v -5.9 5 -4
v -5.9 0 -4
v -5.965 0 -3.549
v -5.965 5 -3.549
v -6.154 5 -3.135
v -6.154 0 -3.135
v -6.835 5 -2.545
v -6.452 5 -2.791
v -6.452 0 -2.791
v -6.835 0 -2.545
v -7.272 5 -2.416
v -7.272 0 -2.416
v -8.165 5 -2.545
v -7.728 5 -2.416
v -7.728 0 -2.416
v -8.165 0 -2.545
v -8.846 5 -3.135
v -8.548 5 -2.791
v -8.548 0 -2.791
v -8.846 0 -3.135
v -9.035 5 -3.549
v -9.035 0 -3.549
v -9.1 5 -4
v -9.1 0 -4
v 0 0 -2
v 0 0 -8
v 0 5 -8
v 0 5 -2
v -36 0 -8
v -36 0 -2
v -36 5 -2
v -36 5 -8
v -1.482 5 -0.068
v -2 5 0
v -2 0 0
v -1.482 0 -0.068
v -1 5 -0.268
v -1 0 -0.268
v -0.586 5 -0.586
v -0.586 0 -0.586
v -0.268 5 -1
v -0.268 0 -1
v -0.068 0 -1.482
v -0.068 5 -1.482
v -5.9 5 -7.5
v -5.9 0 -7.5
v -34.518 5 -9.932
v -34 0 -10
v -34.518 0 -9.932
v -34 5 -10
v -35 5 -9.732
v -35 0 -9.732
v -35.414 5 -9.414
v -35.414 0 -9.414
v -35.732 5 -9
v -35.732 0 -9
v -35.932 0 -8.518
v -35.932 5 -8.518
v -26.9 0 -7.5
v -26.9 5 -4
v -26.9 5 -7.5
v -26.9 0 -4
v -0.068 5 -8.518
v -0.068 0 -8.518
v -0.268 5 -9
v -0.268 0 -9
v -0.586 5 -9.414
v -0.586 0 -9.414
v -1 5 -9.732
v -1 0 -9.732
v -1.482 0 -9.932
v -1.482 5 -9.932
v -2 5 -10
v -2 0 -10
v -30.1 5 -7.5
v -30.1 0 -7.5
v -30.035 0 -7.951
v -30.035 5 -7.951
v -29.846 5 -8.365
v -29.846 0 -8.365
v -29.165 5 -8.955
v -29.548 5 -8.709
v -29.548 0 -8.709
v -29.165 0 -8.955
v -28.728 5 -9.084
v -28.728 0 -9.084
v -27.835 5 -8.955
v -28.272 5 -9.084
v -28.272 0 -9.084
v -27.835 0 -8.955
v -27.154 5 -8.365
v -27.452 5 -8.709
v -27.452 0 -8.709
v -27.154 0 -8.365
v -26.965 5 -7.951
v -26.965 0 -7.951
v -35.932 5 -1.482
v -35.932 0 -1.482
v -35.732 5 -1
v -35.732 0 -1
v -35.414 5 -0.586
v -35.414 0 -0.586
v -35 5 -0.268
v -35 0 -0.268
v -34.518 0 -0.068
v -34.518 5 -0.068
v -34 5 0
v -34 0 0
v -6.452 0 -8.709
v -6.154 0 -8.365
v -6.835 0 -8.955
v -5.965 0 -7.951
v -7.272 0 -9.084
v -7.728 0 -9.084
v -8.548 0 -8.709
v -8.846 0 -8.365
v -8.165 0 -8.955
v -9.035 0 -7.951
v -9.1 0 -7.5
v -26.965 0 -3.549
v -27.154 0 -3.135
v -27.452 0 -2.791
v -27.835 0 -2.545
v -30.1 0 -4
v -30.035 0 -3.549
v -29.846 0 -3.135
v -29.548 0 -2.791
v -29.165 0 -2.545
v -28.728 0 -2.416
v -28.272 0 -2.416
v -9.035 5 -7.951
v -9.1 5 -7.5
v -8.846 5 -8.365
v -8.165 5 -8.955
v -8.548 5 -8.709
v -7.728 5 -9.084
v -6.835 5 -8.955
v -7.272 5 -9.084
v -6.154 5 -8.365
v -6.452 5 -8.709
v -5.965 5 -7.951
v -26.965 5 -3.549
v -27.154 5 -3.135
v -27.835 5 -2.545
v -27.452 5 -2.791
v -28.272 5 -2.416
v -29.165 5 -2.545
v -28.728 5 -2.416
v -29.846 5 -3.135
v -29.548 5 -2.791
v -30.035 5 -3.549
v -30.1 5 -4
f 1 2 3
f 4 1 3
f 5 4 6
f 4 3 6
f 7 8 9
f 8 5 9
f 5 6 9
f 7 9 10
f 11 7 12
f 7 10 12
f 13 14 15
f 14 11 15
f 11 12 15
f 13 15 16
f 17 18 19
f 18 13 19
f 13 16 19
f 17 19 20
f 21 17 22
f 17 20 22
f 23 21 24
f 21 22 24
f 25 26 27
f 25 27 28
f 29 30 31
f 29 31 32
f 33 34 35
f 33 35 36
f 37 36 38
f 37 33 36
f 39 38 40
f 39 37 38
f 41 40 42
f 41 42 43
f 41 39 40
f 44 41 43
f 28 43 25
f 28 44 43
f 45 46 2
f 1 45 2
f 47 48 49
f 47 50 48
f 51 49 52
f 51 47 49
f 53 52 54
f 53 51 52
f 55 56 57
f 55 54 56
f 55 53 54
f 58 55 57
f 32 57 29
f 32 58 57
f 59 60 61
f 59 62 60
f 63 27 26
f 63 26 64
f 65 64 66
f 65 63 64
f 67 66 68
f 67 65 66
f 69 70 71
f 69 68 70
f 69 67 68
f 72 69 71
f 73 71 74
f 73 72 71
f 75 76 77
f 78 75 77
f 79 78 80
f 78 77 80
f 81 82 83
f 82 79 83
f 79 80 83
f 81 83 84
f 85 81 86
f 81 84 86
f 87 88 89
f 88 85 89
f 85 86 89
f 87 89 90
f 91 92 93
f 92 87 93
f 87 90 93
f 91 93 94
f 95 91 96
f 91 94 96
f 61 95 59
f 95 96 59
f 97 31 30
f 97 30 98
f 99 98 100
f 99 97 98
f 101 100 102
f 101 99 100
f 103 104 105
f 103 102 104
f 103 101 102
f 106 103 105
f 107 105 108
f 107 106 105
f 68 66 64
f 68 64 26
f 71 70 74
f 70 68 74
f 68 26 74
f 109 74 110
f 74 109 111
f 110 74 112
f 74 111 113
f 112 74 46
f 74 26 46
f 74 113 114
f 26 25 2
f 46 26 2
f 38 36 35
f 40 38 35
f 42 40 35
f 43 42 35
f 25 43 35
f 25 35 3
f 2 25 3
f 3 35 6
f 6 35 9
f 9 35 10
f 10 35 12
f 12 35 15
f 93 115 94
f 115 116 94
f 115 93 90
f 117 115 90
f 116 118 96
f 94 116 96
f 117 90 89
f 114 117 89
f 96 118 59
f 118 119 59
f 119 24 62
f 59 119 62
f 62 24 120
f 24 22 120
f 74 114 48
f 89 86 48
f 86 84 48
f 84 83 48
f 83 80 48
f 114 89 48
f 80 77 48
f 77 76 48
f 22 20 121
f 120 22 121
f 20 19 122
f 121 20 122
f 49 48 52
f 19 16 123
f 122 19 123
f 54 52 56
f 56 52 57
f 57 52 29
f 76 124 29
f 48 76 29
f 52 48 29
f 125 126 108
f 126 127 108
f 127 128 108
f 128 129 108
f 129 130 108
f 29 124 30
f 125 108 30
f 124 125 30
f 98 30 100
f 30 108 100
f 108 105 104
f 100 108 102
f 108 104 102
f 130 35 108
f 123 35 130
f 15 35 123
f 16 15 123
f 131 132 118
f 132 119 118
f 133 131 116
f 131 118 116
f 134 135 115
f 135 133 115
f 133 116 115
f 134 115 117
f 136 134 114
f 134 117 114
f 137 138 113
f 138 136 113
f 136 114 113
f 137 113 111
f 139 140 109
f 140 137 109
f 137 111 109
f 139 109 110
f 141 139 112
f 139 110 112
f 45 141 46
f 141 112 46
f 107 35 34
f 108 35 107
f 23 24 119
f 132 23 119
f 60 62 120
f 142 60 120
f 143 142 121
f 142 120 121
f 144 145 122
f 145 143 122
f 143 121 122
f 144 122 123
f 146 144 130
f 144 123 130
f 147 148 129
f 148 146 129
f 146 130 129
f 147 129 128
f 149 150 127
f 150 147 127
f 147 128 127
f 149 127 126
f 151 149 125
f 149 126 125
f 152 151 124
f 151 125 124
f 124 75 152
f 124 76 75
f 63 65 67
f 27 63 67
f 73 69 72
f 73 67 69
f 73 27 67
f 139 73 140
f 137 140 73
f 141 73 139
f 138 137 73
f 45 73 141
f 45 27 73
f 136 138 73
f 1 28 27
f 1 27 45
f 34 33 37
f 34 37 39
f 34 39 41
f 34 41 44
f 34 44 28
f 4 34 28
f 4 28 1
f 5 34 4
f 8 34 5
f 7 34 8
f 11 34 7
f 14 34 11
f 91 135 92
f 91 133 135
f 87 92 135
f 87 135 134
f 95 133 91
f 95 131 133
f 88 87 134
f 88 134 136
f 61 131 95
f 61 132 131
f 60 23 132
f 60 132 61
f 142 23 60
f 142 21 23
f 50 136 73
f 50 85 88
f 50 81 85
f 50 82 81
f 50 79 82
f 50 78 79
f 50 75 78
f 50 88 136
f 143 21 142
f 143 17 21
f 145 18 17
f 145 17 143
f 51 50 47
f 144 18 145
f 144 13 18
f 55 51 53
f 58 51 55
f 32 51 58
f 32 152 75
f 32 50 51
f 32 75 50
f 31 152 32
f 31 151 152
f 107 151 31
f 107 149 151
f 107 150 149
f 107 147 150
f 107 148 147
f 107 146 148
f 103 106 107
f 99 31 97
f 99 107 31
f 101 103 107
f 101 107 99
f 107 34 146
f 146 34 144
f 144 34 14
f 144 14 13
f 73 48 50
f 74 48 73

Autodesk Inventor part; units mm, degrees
ref_plane "YZ Plane" through (0, 0, 0) normal (1, 0, 0) x (0, 1, 0)
ref_plane "XZ Plane" through (0, 0, 0) normal (0, 1, 0) x (-1, 0, 0)
ref_plane "XY Plane" through (0, 0, 0) normal (0, 0, 1) x (1, 0, 0)
sketch "Sketch1" plane through (0, 0, 0) normal (0, 1, 0) x (-1, 0, 0)
  line L0 (0, 0) -> (36, 0)
  line L1 (36, 0) -> (36, -10)
  line L2 (36, -10) -> (0, -10)
  line L3 (0, -10) -> (0, 0)
  line L4 (18, 26.1157) -> (18, -38.8106) construction
  line L5 (28.5, 12.3286) -> (28.5, -24.6324) construction
  line L6 (7.5, 13.3064) -> (7.5, -23.3613) construction
  line L7 (28.5, -7.5) -> (28.5, -4) construction
  line L8 (30.1, -7.5) -> (30.1, -4)
  line L9 (26.9, -4) -> (26.9, -7.5)
  arc A0 (26.9, -7.5) -> (30.1, -7.5) centre (28.5, -7.5) ccw
  arc A1 (30.1, -4) -> (26.9, -4) centre (28.5, -4) ccw
  line L10 (7.5, -7.5) -> (7.5, -4) construction
  line L11 (5.9, -7.5) -> (5.9, -4)
  line L12 (9.1, -4) -> (9.1, -7.5)
  arc A2 (5.9, -7.5) -> (9.1, -7.5) centre (7.5, -7.5) ccw
  arc A3 (9.1, -4) -> (5.9, -4) centre (7.5, -4) ccw
  point P0 (18, 0)
  point P1 (28.5, -5.75)
  point P2 (7.5, -5.75)
  dimension "d0" = 36
  dimension "d1" = 10
  dimension "d2" = 21
  dimension "d3" = 3.5
  dimension "d4" = 3.2
  dimension "d5" = 2.5
extrude "Extrusion1" add sketch "Sketch1" along normal blind 5
fillet "Fillet1" radius 2 4 edges at (0, 2.5, 0) (0, 2.5, -10) (-36, 2.5, -10) (-36, 2.5, 0)
properties part number "LipoBat Spacer"
